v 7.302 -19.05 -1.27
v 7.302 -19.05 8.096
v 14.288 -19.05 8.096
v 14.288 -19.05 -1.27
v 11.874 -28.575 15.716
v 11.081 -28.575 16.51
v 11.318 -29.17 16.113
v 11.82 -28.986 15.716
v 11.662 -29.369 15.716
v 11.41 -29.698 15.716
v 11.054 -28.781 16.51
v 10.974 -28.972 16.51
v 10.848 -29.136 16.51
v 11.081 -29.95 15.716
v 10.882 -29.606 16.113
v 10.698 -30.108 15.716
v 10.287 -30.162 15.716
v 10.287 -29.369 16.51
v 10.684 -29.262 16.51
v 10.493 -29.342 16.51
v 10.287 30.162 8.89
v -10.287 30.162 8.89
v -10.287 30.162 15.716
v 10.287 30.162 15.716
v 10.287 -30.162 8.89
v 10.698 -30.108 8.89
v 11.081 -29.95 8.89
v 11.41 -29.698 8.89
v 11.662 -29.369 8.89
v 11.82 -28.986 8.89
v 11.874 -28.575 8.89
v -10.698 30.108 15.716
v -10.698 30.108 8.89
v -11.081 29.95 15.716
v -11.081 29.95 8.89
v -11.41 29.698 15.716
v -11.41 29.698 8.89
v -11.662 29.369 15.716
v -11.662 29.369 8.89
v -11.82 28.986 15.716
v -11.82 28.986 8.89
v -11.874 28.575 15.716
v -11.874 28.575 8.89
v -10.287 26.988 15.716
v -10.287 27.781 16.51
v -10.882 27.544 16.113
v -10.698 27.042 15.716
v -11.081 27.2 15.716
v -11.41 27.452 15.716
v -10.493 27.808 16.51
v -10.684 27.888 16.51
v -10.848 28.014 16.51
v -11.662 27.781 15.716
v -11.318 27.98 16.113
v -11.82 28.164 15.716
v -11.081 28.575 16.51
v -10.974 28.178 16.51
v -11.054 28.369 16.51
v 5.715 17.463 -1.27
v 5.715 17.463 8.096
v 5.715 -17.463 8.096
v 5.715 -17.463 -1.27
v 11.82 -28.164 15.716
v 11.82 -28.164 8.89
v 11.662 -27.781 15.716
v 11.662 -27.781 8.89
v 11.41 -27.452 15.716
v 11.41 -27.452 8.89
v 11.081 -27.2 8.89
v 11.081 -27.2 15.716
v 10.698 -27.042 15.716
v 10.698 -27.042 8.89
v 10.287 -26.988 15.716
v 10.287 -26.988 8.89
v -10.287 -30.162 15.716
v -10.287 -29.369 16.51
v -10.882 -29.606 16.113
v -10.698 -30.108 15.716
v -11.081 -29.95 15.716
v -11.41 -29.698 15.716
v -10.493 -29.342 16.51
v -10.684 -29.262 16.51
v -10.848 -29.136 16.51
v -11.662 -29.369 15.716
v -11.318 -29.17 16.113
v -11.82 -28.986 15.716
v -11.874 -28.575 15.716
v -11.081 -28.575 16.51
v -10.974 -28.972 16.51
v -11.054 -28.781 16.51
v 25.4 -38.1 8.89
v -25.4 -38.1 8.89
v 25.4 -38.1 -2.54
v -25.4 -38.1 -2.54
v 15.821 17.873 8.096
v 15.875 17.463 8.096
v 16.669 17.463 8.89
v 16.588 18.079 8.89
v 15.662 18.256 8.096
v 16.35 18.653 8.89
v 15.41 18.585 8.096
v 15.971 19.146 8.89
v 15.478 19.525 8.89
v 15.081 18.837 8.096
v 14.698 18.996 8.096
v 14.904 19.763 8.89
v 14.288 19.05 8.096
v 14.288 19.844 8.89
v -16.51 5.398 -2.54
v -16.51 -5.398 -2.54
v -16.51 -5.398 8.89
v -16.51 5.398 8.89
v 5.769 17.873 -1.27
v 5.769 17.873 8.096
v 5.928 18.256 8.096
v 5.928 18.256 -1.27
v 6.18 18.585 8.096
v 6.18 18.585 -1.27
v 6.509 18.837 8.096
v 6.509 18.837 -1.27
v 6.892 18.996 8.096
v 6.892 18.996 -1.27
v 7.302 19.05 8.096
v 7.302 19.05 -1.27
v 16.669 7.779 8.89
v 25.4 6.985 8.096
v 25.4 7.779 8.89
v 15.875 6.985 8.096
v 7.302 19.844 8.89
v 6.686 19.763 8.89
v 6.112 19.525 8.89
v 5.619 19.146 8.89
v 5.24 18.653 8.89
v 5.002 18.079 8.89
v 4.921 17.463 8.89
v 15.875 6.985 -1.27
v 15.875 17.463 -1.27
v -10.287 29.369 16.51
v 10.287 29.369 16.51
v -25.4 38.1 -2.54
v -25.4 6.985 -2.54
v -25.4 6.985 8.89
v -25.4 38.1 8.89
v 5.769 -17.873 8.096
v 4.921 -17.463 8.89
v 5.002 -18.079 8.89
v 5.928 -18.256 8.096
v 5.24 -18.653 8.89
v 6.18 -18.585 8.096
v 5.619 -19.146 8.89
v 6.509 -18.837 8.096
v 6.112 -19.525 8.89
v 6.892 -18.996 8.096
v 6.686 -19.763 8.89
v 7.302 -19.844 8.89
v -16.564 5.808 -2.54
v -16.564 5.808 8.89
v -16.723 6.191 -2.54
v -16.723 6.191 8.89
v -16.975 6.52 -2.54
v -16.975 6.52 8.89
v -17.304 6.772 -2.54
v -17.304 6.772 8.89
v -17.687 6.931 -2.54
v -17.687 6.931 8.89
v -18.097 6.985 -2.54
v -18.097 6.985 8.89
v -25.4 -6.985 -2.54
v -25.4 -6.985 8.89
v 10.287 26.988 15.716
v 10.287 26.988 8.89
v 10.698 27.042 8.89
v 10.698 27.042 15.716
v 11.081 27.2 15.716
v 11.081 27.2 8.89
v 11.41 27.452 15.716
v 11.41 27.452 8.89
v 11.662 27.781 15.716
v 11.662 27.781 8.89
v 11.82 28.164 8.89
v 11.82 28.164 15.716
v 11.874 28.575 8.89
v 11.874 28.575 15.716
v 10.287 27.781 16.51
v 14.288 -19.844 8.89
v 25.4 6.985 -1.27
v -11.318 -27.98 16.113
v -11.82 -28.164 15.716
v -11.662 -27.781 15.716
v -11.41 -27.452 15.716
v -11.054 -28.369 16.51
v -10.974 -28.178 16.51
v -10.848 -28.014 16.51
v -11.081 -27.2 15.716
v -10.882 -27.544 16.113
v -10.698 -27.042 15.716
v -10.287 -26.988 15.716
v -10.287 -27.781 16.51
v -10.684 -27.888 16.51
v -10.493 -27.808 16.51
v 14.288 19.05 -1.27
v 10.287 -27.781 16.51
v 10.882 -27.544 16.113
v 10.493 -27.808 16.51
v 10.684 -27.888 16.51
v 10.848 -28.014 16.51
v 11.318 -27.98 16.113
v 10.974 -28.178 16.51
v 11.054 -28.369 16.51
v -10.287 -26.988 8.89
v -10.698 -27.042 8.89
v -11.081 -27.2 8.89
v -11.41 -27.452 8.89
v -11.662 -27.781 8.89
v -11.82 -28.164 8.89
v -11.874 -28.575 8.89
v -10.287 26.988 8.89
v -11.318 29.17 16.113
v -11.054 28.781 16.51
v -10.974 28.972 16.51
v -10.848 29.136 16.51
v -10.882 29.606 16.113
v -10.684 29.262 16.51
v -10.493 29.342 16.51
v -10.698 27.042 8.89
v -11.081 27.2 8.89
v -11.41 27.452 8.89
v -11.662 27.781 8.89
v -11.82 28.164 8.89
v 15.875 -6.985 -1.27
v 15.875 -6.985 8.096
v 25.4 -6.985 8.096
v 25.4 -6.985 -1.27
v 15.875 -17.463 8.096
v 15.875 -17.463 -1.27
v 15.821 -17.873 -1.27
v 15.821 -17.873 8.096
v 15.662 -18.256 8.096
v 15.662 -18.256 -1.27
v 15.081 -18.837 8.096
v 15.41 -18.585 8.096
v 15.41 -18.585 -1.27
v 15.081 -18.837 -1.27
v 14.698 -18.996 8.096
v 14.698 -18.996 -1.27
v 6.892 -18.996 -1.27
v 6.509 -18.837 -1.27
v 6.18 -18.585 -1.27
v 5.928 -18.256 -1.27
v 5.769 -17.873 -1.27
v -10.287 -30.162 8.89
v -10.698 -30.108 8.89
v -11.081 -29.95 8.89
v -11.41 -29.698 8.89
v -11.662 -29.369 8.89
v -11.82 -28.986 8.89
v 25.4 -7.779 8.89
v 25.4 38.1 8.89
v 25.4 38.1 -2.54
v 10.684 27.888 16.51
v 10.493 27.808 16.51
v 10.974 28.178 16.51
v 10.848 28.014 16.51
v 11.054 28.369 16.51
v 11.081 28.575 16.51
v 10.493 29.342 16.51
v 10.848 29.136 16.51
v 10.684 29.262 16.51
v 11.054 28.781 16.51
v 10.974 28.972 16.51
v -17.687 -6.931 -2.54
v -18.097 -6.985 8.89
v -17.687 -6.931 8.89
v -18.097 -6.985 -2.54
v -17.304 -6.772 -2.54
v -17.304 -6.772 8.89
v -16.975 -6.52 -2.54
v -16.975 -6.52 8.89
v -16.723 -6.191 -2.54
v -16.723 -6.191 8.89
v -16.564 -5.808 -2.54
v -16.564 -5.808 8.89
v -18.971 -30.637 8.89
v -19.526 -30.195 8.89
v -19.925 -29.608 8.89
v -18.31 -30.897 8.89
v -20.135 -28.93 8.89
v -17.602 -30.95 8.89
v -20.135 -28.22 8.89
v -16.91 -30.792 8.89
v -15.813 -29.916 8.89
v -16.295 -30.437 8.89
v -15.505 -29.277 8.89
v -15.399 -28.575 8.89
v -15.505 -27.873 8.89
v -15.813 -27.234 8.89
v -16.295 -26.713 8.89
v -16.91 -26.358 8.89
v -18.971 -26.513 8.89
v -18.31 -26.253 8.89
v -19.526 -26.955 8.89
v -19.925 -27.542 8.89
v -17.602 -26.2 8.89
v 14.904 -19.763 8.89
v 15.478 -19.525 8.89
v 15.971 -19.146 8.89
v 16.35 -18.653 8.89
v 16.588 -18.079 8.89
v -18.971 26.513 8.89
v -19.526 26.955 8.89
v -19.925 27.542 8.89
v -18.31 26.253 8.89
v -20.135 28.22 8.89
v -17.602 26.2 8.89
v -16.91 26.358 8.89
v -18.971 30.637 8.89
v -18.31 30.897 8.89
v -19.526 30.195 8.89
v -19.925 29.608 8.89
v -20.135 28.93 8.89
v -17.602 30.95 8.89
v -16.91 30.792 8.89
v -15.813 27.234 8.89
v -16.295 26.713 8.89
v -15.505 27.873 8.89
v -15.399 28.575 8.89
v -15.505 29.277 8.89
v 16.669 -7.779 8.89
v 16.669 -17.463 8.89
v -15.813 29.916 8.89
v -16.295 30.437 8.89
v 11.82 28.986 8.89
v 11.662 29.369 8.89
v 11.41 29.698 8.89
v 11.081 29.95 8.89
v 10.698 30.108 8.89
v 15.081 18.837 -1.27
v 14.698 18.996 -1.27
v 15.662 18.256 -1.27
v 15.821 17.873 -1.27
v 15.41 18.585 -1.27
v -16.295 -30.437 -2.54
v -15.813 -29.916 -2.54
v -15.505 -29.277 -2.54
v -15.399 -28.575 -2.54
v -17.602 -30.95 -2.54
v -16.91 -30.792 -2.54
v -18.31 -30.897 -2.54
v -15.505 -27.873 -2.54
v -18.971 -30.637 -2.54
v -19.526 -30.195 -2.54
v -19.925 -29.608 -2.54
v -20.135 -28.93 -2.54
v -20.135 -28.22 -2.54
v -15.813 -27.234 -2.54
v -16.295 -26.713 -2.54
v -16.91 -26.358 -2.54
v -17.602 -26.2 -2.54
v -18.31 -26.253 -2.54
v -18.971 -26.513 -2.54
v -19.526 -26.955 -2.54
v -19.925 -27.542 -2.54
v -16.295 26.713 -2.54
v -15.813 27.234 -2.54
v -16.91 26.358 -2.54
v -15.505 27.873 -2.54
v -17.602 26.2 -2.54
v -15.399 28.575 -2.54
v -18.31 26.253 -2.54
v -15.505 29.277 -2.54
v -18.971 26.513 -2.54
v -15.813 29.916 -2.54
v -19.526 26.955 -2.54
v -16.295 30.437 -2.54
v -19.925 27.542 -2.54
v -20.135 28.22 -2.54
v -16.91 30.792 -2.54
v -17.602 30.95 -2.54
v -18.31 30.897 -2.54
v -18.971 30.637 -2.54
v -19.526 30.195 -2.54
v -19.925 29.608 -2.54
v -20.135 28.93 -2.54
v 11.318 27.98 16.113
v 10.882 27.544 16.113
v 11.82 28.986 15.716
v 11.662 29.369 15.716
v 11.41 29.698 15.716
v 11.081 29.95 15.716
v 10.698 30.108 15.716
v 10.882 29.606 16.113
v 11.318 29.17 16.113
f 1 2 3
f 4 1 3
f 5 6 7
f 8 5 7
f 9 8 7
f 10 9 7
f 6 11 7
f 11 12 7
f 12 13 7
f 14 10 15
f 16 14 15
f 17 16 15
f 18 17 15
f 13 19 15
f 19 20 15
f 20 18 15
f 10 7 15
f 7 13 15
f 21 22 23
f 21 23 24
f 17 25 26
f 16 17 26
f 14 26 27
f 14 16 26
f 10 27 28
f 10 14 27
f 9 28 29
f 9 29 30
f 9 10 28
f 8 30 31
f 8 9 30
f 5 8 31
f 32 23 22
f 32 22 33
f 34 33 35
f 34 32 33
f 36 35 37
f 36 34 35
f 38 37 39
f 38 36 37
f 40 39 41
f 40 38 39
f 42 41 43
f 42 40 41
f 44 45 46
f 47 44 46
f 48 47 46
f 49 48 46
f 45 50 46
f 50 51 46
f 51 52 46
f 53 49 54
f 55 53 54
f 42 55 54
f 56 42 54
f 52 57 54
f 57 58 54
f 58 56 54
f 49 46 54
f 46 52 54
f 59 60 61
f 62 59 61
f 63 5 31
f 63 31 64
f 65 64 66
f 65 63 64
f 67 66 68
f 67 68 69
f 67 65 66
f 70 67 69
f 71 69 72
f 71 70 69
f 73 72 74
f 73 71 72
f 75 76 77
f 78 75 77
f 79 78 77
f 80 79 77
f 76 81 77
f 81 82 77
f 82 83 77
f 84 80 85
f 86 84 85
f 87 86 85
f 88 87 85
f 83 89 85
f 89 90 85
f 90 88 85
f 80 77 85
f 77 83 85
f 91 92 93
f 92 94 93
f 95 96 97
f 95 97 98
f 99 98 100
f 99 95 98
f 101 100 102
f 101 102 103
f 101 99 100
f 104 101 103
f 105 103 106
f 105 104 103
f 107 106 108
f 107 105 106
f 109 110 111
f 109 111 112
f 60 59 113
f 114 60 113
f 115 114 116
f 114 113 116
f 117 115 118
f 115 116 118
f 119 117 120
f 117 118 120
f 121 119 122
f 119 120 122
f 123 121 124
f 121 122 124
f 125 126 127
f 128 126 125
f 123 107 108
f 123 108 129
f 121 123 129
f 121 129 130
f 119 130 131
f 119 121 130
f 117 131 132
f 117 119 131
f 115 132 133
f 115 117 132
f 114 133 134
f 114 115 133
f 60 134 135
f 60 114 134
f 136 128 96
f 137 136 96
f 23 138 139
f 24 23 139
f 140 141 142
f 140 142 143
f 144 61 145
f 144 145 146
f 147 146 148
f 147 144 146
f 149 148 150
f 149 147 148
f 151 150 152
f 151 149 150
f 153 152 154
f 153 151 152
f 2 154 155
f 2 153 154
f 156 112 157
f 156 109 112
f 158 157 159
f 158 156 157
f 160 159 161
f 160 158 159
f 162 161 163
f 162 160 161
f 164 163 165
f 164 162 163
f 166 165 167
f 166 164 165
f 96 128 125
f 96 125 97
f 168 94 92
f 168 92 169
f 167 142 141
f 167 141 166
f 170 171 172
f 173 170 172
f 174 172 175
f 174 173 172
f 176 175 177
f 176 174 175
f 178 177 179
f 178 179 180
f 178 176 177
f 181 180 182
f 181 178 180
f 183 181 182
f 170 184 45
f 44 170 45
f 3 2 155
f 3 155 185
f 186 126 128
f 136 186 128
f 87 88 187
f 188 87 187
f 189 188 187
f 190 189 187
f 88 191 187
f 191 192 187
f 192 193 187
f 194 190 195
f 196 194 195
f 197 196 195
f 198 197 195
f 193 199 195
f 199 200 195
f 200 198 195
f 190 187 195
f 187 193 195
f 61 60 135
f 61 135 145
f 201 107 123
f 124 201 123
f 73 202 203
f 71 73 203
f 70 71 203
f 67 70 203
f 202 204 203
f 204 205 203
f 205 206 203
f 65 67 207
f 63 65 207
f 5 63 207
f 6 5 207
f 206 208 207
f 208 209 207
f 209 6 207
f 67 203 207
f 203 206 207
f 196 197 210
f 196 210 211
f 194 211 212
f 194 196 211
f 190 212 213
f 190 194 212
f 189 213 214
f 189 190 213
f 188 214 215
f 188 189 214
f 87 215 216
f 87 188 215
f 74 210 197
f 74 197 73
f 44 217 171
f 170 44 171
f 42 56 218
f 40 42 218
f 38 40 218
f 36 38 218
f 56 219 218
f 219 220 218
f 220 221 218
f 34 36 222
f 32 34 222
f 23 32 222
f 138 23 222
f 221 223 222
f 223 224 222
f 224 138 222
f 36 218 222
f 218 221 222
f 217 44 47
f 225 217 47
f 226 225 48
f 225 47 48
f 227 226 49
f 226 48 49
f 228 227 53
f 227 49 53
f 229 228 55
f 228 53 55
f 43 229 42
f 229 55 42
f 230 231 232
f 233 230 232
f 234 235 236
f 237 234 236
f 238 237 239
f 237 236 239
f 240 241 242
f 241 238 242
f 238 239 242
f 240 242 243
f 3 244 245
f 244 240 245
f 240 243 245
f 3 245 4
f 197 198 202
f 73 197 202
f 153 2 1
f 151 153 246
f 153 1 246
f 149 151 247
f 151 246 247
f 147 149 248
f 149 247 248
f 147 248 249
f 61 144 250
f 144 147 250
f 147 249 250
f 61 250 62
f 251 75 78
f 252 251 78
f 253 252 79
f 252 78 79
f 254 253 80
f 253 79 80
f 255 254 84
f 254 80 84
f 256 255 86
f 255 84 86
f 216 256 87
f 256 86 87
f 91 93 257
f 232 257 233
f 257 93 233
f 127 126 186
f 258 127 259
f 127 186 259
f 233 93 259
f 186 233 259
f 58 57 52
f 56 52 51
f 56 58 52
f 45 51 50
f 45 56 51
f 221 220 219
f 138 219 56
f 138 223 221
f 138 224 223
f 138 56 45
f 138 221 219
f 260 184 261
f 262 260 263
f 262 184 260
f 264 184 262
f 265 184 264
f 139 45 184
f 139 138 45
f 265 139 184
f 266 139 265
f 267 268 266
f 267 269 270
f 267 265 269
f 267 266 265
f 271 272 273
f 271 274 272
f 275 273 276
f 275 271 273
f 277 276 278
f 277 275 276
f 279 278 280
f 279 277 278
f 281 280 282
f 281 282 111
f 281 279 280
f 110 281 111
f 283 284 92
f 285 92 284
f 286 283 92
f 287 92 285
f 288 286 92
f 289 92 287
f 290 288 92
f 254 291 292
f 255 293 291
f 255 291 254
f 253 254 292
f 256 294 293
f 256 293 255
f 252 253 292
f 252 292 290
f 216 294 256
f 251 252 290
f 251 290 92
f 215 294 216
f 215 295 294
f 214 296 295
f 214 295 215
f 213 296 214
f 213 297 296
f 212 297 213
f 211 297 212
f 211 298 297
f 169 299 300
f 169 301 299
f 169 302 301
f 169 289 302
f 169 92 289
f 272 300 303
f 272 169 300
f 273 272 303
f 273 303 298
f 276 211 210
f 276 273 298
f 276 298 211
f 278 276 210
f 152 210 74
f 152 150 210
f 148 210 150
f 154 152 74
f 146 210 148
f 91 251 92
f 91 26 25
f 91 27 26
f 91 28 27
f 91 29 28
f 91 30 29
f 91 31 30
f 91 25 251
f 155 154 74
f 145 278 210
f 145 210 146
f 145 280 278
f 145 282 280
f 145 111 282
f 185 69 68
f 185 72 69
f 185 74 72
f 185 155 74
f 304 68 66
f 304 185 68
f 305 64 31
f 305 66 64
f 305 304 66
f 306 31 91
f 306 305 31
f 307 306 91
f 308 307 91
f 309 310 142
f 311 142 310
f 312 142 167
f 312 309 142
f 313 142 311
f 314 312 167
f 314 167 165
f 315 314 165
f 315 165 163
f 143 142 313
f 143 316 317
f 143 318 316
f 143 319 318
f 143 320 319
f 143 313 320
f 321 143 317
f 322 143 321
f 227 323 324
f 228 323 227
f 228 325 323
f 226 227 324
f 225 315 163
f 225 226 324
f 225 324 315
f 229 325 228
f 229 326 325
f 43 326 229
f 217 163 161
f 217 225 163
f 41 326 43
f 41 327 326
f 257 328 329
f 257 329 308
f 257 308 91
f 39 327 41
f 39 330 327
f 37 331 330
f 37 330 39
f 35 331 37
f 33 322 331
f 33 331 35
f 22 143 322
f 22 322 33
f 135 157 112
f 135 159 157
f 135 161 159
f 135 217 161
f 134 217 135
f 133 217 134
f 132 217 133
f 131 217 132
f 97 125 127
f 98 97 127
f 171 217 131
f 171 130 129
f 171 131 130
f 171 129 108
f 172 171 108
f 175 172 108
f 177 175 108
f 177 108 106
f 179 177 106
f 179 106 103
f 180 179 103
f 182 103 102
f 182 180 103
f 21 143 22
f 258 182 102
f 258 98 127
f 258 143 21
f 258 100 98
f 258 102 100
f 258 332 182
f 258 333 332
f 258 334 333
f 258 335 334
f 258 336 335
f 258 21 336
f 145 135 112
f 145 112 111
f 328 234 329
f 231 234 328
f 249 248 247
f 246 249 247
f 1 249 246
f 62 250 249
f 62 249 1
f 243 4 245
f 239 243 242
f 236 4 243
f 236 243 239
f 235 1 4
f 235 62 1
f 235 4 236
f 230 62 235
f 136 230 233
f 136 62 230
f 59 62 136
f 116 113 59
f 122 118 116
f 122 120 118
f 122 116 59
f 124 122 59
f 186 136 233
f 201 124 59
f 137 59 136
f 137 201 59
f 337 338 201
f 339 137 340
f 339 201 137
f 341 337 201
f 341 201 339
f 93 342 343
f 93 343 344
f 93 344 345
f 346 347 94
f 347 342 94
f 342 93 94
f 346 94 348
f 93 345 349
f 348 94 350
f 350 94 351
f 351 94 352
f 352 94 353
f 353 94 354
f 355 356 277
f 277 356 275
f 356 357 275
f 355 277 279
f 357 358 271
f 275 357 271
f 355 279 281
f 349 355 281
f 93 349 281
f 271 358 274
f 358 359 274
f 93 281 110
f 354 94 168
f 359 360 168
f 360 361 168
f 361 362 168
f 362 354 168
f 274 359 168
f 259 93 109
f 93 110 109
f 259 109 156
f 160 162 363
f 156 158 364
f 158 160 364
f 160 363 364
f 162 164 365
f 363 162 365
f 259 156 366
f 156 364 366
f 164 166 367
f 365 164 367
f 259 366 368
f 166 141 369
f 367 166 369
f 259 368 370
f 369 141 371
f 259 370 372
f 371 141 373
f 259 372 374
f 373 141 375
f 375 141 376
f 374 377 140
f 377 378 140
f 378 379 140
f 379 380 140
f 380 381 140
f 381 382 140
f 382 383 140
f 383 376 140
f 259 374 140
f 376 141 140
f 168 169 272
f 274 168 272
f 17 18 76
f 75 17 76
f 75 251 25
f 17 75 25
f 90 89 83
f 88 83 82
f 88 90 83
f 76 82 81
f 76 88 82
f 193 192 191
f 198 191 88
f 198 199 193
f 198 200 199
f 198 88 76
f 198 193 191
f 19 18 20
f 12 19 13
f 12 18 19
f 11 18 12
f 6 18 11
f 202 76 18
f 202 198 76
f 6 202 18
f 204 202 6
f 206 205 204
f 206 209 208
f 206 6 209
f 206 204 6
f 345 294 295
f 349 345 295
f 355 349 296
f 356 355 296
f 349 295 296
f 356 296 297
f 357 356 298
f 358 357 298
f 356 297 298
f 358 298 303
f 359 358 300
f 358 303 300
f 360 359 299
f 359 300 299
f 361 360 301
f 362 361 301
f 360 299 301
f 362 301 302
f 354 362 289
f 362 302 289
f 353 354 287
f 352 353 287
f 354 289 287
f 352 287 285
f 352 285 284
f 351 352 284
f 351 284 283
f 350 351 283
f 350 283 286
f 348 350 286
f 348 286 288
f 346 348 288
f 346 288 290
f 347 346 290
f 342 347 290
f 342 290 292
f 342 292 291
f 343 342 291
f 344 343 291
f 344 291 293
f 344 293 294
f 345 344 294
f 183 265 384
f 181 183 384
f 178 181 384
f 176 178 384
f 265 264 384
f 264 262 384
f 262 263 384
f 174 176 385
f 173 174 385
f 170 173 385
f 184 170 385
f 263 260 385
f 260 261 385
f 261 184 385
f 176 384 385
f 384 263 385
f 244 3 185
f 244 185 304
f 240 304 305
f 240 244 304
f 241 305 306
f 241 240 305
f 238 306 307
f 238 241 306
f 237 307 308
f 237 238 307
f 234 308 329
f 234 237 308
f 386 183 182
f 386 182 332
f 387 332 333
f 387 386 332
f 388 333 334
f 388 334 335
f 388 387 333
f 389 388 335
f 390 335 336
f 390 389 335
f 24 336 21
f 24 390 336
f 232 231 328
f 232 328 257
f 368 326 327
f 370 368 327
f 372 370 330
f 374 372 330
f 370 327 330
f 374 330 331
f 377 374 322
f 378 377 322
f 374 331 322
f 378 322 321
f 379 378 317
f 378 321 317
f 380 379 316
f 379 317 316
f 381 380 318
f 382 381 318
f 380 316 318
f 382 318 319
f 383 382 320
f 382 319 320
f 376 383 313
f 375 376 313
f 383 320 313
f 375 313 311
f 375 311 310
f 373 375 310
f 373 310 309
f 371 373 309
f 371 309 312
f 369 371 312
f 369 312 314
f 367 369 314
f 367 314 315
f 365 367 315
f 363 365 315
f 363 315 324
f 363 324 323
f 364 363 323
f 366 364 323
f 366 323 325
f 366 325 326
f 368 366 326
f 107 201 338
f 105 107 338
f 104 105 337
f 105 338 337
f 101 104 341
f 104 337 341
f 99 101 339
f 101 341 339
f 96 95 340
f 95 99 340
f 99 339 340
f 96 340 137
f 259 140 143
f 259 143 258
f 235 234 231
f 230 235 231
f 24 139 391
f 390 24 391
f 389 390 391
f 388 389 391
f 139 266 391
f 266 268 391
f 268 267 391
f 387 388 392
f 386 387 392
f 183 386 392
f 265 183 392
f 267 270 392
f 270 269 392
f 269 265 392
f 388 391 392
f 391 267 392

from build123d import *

# Parameters (mm, degrees)
SKETCH1_W           = 76.2
SKETCH1_H           = 50.8
BOSS_EXTRUDE1_DEPTH = 2.54
SKETCH2_W           = 50.8
SKETCH2_H           = 76.2
BOSS_EXTRUDE2_DEPTH = 8.89
CUT_EXTRUDE1_DEPTH  = 10.16
SKETCH4_W           = 8.89
SKETCH4_H           = 13.97
CUT_EXTRUDE2_DEPTH  = 48.195496607
SKETCH5_R           = 2.38125
CUT_EXTRUDE3_DEPTH  = 48.195496607
SKETCH9_W           = 23.749
SKETCH9_H           = 3.175
BOSS_EXTRUDE4_DEPTH = 7.62
FILLET1_R           = 1.5875
CHAMFER2_SIZE       = 0.79375


with BuildPart() as part:
    # Sketch1 → Boss-Extrude1 (new body)
    with BuildSketch(Plane(origin=(0, 0, 0), x_dir=(0, 1, 0), z_dir=(0, 0, 1))):
        Rectangle(SKETCH1_W, SKETCH1_H)
    extrude(amount=-BOSS_EXTRUDE1_DEPTH)

    # Sketch2 → Boss-Extrude2 (add)
    with BuildSketch(Plane.XY):
        Rectangle(SKETCH2_W, SKETCH2_H)
    extrude(amount=BOSS_EXTRUDE2_DEPTH)

    # Sketch3 → Cut-Extrude1 (cut)
    with BuildSketch(Plane.XY.offset(8.89)):
        Polygon((5.715, 19.05), (5.715, -19.05), (15.875, -19.05), (15.875, -6.985), (25.4, -6.985), (25.4, 6.985), (15.875, 6.985), (15.875, 19.05), align=None)
    extrude(amount=-CUT_EXTRUDE1_DEPTH, mode=Mode.SUBTRACT)

    # Sketch4 → Cut-Extrude2 (cut, through all)
    with BuildSketch(Plane.XY.offset(8.89)):
        with Locations((-20.955, 0)):
            Rectangle(SKETCH4_W, SKETCH4_H)
    extrude(amount=-CUT_EXTRUDE2_DEPTH, mode=Mode.SUBTRACT)

    # Sketch5 → Cut-Extrude3 (cut, through all)
    with BuildSketch(Plane.XY.offset(8.89)):
        with Locations((-17.78, -28.575)):
            Circle(SKETCH5_R)
        with Locations((-17.78, 28.575)):
            Circle(SKETCH5_R)
    extrude(amount=-CUT_EXTRUDE3_DEPTH, mode=Mode.SUBTRACT)

    # Sketch9 → Boss-Extrude4 (add)
    with BuildSketch(Plane.XY.offset(8.89)):
        with Locations((0, 28.575)):
            Rectangle(SKETCH9_W, SKETCH9_H)
        with Locations((0, -28.575)):
            Rectangle(SKETCH9_W, SKETCH9_H)
    extrude(amount=BOSS_EXTRUDE4_DEPTH)

    # Fillet1
    fillet1_edges = [part.edges().sort_by_distance(p)[0] for p in [
        (5.715, 19.05, 3.81),
        (15.875, 19.05, 3.81),
        (5.715, -19.05, 3.81),
        (15.875, -19.05, 3.81),
        (-16.51, 6.985, 3.175),
        (-16.51, -6.985, 3.175),
        (-11.8745, 30.1625, 12.7),
        (-11.8745, 26.9875, 12.7),
        (11.8745, 30.1625, 12.7),
        (11.8745, 26.9875, 12.7),
        (-11.8745, -26.9875, 12.7),
        (-11.8745, -30.1625, 12.7),
        (11.8745, -26.9875, 12.7),
        (11.8745, -30.1625, 12.7),
    ]]
    fillet(fillet1_edges, radius=FILLET1_R - 0.0001)  # a hair under: the kernel refuses the full size

    # Chamfer2
    chamfer2_edges = [part.edges().sort_by_distance(p)[0] for p in [
        (0, -26.9875, 16.51),
        (0, -30.1625, 16.51),
        (11.409561304, -29.697561304, 16.51),
        (11.409561304, -27.452438696, 16.51),
        (-11.409561304, -29.697561304, 16.51),
        (-11.409561304, -27.452438696, 16.51),
        (0, 30.1625, 16.51),
        (0, 26.9875, 16.51),
        (11.409561304, 27.452438696, 16.51),
        (11.409561304, 29.697561304, 16.51),
        (-11.409561304, 27.452438696, 16.51),
        (-11.409561304, 29.697561304, 16.51),
        (5.715, 0, 8.89),
        (10.795, 19.05, 8.89),
        (10.795, -19.05, 8.89),
        (15.875, -12.2238, 8.89),
        (6.179938696, 18.585061304, 8.89),
        (15.410061304, 18.585061304, 8.89),
        (6.179938696, -18.585061304, 8.89),
        (15.410061304, -18.585061304, 8.89),
        (20.6375, -6.985, 8.89),
        (20.6375, 6.985, 8.89),
        (15.875, 12.2238, 8.89),
    ]]
    chamfer(chamfer2_edges, length=CHAMFER2_SIZE)


solid = part.part
